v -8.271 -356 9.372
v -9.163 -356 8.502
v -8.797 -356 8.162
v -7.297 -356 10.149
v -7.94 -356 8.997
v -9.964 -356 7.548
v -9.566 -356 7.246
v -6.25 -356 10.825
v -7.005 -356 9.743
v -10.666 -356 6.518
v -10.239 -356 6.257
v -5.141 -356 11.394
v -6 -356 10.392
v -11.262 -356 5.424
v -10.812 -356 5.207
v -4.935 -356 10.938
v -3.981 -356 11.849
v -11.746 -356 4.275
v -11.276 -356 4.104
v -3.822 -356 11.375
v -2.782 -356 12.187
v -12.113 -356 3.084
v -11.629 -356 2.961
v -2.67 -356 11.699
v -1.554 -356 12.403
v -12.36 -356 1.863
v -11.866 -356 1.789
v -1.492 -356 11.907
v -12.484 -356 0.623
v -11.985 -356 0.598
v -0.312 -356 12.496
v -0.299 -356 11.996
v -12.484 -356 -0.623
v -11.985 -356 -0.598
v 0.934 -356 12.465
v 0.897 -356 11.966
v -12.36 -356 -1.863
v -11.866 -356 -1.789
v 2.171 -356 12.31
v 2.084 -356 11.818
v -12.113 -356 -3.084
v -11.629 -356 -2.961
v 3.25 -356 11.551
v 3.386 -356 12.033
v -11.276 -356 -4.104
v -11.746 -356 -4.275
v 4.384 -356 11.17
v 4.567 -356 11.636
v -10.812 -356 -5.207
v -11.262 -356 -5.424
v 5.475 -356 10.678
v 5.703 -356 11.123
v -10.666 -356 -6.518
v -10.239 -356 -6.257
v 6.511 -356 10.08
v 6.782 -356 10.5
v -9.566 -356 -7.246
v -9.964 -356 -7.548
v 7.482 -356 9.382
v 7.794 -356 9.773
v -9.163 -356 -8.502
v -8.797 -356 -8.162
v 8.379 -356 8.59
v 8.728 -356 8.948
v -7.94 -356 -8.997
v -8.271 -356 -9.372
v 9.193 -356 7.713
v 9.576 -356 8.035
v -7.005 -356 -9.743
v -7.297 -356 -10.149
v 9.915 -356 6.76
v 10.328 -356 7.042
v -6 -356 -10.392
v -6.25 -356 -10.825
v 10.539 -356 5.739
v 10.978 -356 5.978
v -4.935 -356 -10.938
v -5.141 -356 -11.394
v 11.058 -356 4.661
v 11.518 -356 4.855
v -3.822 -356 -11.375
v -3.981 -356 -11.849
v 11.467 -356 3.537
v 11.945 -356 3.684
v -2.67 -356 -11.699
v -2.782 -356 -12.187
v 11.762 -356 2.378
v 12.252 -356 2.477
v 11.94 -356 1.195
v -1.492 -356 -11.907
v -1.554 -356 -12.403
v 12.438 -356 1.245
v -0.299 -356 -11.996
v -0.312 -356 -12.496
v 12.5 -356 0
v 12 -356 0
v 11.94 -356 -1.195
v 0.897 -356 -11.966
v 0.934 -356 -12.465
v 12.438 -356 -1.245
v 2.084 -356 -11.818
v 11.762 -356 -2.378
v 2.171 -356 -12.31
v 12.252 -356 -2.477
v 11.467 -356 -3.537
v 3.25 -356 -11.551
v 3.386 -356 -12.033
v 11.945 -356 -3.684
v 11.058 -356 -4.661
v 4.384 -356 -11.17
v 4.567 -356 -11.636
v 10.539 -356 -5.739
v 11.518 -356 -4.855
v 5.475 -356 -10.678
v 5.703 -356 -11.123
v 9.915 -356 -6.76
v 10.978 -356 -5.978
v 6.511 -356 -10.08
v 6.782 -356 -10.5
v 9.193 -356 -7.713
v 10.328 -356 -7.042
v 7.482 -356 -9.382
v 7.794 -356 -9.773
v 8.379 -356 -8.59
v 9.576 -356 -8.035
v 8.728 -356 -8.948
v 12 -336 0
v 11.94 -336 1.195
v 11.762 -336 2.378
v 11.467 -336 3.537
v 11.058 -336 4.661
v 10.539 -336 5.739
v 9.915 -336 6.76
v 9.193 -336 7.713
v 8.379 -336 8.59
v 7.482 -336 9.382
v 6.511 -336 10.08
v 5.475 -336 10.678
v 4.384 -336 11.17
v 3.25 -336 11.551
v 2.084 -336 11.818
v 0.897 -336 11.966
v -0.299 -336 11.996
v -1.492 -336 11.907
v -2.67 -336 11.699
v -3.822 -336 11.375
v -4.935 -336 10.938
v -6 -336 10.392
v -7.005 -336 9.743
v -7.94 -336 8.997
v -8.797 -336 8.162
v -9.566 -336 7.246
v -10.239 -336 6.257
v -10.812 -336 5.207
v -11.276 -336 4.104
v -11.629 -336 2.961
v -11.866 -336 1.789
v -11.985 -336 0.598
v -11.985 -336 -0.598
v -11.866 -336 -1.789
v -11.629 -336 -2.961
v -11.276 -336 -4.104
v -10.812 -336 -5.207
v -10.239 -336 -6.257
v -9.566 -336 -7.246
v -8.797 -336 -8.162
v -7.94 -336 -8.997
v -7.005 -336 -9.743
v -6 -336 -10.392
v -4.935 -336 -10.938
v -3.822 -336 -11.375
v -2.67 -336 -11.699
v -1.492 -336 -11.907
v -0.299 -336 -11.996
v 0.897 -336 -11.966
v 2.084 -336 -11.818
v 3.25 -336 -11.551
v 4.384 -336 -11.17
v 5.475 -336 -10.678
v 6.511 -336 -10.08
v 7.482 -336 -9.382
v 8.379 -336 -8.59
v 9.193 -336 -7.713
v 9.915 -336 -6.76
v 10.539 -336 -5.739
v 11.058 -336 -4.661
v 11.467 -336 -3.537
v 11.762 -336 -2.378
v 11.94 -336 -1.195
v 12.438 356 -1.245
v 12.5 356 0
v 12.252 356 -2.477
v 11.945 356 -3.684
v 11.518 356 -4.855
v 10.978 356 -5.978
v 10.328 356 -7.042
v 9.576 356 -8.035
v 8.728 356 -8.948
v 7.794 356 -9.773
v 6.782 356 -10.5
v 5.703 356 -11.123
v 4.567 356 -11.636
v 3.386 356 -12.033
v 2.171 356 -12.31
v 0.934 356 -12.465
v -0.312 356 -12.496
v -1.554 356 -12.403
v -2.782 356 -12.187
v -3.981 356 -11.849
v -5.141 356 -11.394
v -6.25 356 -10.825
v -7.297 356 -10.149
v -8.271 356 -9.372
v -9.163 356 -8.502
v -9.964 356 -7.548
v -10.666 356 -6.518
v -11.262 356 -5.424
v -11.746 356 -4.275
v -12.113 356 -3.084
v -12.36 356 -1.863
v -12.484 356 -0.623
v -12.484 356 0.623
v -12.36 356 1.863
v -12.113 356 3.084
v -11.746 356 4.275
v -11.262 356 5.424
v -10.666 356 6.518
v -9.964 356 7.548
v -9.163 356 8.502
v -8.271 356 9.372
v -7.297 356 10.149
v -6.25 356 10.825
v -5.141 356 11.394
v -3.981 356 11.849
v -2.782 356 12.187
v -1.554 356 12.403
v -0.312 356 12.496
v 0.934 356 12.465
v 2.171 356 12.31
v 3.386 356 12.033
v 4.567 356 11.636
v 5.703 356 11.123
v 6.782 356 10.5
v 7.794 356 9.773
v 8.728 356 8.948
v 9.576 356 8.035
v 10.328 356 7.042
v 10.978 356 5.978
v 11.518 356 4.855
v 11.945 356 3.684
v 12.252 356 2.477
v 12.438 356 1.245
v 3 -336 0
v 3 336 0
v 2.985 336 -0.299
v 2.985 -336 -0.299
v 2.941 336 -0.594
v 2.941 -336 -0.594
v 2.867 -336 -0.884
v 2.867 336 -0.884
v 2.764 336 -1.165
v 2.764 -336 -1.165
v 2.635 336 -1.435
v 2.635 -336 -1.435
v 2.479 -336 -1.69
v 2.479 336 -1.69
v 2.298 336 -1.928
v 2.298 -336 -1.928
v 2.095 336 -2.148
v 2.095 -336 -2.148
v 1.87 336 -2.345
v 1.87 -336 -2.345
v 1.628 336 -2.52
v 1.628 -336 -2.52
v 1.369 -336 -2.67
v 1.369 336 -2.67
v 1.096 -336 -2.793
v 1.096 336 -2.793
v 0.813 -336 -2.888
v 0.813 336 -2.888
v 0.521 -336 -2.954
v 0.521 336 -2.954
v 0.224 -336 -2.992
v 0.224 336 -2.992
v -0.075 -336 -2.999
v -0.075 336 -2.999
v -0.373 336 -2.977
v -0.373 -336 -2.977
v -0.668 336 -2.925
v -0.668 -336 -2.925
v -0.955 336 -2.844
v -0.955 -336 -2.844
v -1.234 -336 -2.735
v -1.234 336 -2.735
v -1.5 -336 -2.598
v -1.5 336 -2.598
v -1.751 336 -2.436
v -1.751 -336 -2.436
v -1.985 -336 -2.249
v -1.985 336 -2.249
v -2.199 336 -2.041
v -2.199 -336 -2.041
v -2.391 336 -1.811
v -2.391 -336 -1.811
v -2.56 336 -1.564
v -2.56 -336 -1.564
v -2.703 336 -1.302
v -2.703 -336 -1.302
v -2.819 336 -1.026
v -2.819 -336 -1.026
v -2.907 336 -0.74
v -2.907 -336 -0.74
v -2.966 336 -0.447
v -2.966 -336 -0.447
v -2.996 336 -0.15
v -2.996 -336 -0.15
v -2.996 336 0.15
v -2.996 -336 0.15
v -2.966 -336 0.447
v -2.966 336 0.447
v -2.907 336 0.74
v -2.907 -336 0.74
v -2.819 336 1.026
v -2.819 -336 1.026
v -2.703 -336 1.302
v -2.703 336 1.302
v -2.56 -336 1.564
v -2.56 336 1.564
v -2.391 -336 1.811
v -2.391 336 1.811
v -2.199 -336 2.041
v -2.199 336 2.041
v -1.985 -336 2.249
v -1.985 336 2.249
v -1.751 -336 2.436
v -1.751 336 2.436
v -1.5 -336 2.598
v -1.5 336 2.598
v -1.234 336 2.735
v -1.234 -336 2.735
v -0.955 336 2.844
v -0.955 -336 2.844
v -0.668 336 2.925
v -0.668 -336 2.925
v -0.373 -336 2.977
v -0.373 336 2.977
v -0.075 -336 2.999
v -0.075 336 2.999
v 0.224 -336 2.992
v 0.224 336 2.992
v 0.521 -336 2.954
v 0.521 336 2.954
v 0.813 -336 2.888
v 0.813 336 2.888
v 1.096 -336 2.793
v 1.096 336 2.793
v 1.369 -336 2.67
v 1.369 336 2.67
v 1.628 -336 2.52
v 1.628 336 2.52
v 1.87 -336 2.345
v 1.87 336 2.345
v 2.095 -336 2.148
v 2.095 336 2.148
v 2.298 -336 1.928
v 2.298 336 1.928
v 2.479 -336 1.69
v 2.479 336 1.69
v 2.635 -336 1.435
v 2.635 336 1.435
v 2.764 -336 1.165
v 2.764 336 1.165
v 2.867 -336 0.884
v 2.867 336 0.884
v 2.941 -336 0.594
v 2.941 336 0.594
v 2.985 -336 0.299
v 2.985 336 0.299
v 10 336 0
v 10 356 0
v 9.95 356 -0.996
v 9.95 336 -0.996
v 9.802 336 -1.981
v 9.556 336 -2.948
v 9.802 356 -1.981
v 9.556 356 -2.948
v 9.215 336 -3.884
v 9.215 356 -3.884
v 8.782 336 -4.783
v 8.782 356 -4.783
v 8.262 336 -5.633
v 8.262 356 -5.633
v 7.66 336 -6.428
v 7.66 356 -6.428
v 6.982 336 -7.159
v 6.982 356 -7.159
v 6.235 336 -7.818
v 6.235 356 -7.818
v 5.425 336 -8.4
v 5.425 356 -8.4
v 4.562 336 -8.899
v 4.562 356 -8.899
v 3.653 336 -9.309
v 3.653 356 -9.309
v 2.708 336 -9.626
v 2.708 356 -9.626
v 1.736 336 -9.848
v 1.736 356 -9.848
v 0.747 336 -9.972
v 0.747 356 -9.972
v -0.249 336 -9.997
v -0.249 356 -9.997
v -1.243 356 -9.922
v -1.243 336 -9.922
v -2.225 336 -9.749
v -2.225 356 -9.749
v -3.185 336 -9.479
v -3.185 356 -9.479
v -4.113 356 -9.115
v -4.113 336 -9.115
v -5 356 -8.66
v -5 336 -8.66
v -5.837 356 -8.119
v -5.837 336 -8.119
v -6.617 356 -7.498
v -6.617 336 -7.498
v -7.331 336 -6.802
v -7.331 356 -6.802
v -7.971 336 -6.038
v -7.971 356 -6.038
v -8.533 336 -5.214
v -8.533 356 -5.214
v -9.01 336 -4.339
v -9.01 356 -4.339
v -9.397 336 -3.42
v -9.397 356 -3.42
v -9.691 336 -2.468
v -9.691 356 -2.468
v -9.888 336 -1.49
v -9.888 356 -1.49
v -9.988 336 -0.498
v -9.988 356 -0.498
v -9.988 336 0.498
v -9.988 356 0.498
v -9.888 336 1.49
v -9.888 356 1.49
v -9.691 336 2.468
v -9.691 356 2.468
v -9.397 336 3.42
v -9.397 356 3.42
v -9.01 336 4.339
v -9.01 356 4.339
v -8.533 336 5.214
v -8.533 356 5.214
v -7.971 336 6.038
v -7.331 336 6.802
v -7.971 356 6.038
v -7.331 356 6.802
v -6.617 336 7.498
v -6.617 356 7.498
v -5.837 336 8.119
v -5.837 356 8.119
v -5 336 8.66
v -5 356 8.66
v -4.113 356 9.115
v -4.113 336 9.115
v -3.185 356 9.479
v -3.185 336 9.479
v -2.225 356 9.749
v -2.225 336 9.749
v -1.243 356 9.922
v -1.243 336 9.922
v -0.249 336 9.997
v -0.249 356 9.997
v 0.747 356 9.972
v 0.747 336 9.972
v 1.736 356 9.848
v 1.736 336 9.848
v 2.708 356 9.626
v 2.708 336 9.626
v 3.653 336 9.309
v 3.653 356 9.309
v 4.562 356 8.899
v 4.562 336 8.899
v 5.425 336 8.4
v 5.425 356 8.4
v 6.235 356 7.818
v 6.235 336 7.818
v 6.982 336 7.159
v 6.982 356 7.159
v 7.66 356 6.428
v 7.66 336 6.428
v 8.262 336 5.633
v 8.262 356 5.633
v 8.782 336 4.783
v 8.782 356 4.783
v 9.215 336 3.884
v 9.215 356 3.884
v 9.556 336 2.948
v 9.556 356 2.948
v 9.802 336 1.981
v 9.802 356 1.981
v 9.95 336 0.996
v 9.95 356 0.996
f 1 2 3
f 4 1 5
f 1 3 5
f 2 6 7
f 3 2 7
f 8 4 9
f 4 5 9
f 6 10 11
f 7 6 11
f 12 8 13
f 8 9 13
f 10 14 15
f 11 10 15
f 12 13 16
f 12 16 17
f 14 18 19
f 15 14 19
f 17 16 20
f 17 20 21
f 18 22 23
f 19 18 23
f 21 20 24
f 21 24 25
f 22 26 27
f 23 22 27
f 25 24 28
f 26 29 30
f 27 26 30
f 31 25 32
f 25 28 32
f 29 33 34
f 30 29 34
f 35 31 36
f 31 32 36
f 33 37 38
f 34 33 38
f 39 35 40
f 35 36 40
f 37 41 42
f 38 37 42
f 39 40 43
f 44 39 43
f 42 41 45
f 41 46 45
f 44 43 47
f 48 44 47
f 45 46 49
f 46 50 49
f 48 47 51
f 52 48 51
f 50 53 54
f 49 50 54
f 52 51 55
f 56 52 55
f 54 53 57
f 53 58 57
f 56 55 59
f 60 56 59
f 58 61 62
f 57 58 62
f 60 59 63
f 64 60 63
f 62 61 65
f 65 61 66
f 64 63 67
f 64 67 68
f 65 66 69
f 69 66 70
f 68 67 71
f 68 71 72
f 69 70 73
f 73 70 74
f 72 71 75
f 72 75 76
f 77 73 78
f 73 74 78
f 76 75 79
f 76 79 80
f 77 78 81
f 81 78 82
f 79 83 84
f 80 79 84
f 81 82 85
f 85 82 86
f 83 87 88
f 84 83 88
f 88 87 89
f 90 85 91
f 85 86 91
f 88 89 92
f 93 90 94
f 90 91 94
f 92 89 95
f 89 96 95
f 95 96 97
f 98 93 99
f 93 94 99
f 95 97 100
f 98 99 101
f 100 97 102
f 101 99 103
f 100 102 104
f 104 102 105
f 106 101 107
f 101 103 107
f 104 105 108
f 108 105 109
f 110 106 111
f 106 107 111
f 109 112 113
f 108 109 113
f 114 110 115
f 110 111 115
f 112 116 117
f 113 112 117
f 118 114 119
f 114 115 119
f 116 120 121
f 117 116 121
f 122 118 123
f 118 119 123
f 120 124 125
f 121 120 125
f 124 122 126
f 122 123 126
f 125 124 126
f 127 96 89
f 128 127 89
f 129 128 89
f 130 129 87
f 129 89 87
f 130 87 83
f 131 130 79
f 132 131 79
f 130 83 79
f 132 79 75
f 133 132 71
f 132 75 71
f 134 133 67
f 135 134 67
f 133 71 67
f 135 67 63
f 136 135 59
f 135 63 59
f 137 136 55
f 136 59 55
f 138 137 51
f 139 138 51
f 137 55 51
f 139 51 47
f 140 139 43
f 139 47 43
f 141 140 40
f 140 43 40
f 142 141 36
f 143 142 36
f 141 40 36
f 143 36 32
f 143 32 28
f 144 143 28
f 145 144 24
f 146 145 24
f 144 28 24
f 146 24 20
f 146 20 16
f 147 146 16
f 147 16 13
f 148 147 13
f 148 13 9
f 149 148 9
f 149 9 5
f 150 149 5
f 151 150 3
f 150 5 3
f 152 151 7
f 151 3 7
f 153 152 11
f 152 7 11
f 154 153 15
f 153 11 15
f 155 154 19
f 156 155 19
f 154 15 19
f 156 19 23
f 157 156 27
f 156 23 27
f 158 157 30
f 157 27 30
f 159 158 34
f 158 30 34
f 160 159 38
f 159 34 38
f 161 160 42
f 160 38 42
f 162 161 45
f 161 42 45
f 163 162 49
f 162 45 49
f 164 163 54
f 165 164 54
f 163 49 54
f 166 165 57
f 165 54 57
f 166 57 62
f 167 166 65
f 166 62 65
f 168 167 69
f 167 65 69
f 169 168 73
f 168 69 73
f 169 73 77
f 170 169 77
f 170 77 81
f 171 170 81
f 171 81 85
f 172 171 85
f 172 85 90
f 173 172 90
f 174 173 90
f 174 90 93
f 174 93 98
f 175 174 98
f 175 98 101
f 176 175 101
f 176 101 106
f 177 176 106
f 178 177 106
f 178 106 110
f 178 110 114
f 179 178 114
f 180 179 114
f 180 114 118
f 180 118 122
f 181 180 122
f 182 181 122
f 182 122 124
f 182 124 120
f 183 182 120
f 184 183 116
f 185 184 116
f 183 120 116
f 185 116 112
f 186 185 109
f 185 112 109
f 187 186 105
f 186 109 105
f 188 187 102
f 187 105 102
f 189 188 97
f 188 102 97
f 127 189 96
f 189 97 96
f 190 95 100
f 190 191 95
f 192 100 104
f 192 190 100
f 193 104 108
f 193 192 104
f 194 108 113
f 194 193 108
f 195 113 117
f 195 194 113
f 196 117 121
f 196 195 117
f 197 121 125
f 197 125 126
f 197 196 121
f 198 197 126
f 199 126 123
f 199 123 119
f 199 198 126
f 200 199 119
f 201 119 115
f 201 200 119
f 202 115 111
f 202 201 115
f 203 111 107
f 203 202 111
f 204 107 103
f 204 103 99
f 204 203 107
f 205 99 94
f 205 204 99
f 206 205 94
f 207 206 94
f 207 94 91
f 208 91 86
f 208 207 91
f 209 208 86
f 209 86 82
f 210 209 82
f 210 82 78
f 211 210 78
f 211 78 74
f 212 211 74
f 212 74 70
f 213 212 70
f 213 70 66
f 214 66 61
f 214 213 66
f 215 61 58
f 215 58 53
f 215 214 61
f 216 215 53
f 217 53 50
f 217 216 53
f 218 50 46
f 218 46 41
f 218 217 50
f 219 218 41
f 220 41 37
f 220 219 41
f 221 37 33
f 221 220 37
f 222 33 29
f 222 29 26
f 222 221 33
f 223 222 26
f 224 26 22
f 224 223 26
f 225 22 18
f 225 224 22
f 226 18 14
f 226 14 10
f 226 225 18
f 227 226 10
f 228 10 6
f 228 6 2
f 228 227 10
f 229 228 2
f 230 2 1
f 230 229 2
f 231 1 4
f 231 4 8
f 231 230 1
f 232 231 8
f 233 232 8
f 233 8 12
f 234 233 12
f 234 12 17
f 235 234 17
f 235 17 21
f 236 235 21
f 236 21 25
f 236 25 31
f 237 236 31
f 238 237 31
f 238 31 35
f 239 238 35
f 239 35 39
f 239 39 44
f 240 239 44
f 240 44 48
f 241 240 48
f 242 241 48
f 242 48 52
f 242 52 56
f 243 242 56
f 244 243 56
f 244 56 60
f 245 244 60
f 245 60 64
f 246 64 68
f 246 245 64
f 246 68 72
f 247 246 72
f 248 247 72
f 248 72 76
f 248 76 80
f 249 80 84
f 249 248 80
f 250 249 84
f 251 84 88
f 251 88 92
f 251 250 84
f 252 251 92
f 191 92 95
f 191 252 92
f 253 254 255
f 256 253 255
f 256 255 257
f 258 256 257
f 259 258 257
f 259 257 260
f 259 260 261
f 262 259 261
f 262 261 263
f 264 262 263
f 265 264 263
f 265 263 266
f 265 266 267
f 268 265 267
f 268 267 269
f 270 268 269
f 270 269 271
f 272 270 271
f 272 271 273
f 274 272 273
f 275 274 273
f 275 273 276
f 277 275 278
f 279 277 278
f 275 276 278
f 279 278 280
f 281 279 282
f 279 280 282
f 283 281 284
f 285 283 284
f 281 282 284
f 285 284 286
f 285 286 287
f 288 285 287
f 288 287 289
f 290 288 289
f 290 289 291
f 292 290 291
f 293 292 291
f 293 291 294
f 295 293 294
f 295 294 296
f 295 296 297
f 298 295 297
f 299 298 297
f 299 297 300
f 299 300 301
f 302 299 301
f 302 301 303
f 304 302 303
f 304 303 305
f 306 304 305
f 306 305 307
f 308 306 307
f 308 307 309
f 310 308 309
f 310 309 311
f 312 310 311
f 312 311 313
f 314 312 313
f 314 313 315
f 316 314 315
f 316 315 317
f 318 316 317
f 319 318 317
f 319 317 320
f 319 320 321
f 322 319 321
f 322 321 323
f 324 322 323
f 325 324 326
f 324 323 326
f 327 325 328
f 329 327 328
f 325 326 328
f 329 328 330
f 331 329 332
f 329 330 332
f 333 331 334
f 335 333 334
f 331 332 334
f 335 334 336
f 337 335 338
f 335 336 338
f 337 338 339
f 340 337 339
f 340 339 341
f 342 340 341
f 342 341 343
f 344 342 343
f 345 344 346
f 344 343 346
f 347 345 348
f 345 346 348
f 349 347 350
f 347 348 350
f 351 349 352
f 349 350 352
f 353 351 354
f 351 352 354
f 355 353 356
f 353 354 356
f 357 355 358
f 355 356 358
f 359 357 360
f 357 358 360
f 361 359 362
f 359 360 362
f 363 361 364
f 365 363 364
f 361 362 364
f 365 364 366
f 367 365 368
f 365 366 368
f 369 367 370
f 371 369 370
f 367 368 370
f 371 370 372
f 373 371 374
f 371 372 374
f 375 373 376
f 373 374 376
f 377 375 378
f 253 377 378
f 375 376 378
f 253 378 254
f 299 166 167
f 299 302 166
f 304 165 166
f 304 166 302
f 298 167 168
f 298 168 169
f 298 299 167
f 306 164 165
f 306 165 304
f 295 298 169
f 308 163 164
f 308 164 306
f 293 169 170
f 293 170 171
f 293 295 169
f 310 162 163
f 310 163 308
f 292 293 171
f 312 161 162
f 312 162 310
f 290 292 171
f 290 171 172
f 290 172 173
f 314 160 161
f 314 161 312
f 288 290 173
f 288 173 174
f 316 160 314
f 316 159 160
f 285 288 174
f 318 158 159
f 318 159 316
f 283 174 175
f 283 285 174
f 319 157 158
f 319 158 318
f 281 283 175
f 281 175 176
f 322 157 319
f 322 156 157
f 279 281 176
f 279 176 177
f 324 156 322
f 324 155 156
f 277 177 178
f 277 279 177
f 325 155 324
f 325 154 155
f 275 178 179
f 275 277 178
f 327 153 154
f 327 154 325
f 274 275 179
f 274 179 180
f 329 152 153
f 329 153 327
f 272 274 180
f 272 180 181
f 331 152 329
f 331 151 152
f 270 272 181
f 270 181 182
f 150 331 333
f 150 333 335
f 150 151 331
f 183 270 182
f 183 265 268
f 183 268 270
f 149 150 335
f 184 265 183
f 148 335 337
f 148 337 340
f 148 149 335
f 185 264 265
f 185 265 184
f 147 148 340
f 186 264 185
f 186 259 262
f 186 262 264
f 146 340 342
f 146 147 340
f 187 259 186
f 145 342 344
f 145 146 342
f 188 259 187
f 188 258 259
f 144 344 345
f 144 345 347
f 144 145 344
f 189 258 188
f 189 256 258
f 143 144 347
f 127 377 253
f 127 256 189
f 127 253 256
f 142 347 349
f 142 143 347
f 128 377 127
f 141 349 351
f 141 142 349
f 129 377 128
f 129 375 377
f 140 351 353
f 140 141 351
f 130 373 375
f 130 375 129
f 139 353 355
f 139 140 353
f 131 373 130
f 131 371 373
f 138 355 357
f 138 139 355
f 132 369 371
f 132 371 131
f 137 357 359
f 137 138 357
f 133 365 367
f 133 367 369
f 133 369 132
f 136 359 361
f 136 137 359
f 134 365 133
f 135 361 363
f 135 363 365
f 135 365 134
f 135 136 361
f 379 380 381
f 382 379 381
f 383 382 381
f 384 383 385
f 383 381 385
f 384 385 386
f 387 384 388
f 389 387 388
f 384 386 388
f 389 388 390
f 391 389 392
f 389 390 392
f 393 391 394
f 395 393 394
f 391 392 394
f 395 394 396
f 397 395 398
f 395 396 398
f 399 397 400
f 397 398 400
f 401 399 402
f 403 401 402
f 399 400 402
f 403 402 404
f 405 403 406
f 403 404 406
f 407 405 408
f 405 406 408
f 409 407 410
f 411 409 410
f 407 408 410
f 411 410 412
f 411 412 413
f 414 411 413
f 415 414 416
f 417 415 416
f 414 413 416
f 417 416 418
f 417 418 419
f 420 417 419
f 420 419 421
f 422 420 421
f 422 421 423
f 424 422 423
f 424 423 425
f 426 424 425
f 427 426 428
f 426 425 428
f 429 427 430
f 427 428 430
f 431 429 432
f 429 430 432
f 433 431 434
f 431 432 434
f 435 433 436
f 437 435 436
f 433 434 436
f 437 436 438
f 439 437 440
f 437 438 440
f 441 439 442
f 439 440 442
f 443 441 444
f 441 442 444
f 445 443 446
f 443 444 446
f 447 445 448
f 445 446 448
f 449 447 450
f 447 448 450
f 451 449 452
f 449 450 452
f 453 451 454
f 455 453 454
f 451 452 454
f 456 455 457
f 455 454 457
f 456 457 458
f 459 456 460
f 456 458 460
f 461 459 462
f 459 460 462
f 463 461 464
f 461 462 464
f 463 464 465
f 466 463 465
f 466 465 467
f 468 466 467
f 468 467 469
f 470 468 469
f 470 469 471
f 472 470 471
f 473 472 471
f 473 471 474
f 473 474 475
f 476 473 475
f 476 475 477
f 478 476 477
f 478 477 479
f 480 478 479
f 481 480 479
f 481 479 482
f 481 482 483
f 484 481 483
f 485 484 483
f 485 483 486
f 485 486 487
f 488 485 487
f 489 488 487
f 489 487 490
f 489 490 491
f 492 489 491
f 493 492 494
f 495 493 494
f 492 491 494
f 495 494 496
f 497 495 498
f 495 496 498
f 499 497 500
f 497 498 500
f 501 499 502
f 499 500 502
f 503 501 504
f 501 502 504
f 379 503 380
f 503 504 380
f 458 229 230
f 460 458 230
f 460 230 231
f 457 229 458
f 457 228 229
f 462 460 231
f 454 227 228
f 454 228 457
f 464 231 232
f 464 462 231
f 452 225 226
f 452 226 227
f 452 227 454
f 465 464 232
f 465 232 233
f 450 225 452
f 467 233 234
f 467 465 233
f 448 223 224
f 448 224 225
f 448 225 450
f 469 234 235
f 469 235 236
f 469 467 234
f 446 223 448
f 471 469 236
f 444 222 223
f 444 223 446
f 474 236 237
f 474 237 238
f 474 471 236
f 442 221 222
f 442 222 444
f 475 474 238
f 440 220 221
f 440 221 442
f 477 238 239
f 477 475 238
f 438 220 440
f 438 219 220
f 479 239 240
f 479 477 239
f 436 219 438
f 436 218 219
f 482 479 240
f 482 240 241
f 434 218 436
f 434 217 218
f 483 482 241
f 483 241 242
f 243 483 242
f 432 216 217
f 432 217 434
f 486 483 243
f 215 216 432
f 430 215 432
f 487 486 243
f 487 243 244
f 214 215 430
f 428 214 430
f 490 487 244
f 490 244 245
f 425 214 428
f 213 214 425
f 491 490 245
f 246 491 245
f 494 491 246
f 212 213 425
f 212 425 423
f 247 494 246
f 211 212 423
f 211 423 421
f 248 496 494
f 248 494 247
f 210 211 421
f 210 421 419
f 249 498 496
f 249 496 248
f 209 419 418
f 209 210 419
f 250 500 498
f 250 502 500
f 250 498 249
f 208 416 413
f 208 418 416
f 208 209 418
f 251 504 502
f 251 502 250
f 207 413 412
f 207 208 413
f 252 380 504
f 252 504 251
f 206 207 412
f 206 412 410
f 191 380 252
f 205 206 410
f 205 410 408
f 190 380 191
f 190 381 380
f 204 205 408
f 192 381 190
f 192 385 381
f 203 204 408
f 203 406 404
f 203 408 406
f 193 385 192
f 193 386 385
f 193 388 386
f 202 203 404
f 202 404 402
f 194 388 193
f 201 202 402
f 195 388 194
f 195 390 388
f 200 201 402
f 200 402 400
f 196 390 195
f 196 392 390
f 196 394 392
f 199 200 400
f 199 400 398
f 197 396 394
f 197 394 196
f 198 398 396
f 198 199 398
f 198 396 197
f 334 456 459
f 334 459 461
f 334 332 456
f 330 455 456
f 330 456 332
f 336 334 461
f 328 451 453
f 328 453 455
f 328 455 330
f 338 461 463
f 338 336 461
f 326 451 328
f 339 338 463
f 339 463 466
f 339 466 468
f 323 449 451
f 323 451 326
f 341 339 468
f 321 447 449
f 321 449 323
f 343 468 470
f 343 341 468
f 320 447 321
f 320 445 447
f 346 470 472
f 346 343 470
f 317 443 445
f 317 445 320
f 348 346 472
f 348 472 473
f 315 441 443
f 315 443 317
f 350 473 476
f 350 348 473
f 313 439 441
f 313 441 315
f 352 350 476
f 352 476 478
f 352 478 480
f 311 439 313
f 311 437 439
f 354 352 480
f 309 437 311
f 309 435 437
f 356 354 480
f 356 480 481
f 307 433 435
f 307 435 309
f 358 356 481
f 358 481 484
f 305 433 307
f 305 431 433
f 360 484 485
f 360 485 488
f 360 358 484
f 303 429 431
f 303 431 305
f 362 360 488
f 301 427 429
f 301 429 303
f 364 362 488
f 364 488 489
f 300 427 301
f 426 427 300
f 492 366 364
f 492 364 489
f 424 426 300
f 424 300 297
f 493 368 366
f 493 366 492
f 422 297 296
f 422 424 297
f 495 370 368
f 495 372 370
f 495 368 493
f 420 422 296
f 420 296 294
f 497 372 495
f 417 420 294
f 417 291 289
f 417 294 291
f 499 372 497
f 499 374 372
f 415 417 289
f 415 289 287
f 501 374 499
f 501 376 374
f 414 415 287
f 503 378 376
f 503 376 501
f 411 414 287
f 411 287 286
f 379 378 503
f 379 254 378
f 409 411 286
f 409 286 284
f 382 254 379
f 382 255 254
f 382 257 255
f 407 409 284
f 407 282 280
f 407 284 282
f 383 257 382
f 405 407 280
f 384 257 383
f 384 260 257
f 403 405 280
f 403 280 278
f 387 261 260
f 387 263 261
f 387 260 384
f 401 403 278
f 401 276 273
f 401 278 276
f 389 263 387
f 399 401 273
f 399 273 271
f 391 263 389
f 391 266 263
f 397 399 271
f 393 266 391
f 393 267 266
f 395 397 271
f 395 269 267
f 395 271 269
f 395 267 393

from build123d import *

# Parameters (mm, degrees)
SKETCH_1_R          = 12.5
EXTRUDE_1_DEPTH     = 356
SKETCH_2_R          = 10
CUT_EXTRUDE_1_DEPTH = 20
SKETCH_3_R          = 3
CUT_EXTRUDE_2_DEPTH = 800
SKETCH_4_R          = 12
CUT_EXTRUDE_3_DEPTH = 20


with BuildPart() as part:
    # 草图1 → 凸台-拉伸1 (new body, symmetric)
    with BuildSketch(Plane(origin=(0, 0, 0), x_dir=(1, 0, 0), z_dir=(0, 1, 0))):
        Circle(SKETCH_1_R)
    extrude(amount=EXTRUDE_1_DEPTH, both=True)

    # 草图2 → 切除-拉伸1 (cut)
    with BuildSketch(Plane(origin=(0, 356, 0), x_dir=(1, 0, 0), z_dir=(0, 1, 0))):
        Circle(SKETCH_2_R)
    extrude(amount=-CUT_EXTRUDE_1_DEPTH, mode=Mode.SUBTRACT)

    # 草图3 → 切除-拉伸2 (cut)
    with BuildSketch(Plane(origin=(0, 356, 0), x_dir=(1, 0, 0), z_dir=(0, 1, 0))):
        Circle(SKETCH_3_R)
    extrude(amount=-CUT_EXTRUDE_2_DEPTH, mode=Mode.SUBTRACT)

    # 草图4 → 切除-拉伸3 (cut)
    with BuildSketch(Plane.XZ.offset(356)):
        Circle(SKETCH_4_R)
    extrude(amount=-CUT_EXTRUDE_3_DEPTH, mode=Mode.SUBTRACT)


solid = part.part
